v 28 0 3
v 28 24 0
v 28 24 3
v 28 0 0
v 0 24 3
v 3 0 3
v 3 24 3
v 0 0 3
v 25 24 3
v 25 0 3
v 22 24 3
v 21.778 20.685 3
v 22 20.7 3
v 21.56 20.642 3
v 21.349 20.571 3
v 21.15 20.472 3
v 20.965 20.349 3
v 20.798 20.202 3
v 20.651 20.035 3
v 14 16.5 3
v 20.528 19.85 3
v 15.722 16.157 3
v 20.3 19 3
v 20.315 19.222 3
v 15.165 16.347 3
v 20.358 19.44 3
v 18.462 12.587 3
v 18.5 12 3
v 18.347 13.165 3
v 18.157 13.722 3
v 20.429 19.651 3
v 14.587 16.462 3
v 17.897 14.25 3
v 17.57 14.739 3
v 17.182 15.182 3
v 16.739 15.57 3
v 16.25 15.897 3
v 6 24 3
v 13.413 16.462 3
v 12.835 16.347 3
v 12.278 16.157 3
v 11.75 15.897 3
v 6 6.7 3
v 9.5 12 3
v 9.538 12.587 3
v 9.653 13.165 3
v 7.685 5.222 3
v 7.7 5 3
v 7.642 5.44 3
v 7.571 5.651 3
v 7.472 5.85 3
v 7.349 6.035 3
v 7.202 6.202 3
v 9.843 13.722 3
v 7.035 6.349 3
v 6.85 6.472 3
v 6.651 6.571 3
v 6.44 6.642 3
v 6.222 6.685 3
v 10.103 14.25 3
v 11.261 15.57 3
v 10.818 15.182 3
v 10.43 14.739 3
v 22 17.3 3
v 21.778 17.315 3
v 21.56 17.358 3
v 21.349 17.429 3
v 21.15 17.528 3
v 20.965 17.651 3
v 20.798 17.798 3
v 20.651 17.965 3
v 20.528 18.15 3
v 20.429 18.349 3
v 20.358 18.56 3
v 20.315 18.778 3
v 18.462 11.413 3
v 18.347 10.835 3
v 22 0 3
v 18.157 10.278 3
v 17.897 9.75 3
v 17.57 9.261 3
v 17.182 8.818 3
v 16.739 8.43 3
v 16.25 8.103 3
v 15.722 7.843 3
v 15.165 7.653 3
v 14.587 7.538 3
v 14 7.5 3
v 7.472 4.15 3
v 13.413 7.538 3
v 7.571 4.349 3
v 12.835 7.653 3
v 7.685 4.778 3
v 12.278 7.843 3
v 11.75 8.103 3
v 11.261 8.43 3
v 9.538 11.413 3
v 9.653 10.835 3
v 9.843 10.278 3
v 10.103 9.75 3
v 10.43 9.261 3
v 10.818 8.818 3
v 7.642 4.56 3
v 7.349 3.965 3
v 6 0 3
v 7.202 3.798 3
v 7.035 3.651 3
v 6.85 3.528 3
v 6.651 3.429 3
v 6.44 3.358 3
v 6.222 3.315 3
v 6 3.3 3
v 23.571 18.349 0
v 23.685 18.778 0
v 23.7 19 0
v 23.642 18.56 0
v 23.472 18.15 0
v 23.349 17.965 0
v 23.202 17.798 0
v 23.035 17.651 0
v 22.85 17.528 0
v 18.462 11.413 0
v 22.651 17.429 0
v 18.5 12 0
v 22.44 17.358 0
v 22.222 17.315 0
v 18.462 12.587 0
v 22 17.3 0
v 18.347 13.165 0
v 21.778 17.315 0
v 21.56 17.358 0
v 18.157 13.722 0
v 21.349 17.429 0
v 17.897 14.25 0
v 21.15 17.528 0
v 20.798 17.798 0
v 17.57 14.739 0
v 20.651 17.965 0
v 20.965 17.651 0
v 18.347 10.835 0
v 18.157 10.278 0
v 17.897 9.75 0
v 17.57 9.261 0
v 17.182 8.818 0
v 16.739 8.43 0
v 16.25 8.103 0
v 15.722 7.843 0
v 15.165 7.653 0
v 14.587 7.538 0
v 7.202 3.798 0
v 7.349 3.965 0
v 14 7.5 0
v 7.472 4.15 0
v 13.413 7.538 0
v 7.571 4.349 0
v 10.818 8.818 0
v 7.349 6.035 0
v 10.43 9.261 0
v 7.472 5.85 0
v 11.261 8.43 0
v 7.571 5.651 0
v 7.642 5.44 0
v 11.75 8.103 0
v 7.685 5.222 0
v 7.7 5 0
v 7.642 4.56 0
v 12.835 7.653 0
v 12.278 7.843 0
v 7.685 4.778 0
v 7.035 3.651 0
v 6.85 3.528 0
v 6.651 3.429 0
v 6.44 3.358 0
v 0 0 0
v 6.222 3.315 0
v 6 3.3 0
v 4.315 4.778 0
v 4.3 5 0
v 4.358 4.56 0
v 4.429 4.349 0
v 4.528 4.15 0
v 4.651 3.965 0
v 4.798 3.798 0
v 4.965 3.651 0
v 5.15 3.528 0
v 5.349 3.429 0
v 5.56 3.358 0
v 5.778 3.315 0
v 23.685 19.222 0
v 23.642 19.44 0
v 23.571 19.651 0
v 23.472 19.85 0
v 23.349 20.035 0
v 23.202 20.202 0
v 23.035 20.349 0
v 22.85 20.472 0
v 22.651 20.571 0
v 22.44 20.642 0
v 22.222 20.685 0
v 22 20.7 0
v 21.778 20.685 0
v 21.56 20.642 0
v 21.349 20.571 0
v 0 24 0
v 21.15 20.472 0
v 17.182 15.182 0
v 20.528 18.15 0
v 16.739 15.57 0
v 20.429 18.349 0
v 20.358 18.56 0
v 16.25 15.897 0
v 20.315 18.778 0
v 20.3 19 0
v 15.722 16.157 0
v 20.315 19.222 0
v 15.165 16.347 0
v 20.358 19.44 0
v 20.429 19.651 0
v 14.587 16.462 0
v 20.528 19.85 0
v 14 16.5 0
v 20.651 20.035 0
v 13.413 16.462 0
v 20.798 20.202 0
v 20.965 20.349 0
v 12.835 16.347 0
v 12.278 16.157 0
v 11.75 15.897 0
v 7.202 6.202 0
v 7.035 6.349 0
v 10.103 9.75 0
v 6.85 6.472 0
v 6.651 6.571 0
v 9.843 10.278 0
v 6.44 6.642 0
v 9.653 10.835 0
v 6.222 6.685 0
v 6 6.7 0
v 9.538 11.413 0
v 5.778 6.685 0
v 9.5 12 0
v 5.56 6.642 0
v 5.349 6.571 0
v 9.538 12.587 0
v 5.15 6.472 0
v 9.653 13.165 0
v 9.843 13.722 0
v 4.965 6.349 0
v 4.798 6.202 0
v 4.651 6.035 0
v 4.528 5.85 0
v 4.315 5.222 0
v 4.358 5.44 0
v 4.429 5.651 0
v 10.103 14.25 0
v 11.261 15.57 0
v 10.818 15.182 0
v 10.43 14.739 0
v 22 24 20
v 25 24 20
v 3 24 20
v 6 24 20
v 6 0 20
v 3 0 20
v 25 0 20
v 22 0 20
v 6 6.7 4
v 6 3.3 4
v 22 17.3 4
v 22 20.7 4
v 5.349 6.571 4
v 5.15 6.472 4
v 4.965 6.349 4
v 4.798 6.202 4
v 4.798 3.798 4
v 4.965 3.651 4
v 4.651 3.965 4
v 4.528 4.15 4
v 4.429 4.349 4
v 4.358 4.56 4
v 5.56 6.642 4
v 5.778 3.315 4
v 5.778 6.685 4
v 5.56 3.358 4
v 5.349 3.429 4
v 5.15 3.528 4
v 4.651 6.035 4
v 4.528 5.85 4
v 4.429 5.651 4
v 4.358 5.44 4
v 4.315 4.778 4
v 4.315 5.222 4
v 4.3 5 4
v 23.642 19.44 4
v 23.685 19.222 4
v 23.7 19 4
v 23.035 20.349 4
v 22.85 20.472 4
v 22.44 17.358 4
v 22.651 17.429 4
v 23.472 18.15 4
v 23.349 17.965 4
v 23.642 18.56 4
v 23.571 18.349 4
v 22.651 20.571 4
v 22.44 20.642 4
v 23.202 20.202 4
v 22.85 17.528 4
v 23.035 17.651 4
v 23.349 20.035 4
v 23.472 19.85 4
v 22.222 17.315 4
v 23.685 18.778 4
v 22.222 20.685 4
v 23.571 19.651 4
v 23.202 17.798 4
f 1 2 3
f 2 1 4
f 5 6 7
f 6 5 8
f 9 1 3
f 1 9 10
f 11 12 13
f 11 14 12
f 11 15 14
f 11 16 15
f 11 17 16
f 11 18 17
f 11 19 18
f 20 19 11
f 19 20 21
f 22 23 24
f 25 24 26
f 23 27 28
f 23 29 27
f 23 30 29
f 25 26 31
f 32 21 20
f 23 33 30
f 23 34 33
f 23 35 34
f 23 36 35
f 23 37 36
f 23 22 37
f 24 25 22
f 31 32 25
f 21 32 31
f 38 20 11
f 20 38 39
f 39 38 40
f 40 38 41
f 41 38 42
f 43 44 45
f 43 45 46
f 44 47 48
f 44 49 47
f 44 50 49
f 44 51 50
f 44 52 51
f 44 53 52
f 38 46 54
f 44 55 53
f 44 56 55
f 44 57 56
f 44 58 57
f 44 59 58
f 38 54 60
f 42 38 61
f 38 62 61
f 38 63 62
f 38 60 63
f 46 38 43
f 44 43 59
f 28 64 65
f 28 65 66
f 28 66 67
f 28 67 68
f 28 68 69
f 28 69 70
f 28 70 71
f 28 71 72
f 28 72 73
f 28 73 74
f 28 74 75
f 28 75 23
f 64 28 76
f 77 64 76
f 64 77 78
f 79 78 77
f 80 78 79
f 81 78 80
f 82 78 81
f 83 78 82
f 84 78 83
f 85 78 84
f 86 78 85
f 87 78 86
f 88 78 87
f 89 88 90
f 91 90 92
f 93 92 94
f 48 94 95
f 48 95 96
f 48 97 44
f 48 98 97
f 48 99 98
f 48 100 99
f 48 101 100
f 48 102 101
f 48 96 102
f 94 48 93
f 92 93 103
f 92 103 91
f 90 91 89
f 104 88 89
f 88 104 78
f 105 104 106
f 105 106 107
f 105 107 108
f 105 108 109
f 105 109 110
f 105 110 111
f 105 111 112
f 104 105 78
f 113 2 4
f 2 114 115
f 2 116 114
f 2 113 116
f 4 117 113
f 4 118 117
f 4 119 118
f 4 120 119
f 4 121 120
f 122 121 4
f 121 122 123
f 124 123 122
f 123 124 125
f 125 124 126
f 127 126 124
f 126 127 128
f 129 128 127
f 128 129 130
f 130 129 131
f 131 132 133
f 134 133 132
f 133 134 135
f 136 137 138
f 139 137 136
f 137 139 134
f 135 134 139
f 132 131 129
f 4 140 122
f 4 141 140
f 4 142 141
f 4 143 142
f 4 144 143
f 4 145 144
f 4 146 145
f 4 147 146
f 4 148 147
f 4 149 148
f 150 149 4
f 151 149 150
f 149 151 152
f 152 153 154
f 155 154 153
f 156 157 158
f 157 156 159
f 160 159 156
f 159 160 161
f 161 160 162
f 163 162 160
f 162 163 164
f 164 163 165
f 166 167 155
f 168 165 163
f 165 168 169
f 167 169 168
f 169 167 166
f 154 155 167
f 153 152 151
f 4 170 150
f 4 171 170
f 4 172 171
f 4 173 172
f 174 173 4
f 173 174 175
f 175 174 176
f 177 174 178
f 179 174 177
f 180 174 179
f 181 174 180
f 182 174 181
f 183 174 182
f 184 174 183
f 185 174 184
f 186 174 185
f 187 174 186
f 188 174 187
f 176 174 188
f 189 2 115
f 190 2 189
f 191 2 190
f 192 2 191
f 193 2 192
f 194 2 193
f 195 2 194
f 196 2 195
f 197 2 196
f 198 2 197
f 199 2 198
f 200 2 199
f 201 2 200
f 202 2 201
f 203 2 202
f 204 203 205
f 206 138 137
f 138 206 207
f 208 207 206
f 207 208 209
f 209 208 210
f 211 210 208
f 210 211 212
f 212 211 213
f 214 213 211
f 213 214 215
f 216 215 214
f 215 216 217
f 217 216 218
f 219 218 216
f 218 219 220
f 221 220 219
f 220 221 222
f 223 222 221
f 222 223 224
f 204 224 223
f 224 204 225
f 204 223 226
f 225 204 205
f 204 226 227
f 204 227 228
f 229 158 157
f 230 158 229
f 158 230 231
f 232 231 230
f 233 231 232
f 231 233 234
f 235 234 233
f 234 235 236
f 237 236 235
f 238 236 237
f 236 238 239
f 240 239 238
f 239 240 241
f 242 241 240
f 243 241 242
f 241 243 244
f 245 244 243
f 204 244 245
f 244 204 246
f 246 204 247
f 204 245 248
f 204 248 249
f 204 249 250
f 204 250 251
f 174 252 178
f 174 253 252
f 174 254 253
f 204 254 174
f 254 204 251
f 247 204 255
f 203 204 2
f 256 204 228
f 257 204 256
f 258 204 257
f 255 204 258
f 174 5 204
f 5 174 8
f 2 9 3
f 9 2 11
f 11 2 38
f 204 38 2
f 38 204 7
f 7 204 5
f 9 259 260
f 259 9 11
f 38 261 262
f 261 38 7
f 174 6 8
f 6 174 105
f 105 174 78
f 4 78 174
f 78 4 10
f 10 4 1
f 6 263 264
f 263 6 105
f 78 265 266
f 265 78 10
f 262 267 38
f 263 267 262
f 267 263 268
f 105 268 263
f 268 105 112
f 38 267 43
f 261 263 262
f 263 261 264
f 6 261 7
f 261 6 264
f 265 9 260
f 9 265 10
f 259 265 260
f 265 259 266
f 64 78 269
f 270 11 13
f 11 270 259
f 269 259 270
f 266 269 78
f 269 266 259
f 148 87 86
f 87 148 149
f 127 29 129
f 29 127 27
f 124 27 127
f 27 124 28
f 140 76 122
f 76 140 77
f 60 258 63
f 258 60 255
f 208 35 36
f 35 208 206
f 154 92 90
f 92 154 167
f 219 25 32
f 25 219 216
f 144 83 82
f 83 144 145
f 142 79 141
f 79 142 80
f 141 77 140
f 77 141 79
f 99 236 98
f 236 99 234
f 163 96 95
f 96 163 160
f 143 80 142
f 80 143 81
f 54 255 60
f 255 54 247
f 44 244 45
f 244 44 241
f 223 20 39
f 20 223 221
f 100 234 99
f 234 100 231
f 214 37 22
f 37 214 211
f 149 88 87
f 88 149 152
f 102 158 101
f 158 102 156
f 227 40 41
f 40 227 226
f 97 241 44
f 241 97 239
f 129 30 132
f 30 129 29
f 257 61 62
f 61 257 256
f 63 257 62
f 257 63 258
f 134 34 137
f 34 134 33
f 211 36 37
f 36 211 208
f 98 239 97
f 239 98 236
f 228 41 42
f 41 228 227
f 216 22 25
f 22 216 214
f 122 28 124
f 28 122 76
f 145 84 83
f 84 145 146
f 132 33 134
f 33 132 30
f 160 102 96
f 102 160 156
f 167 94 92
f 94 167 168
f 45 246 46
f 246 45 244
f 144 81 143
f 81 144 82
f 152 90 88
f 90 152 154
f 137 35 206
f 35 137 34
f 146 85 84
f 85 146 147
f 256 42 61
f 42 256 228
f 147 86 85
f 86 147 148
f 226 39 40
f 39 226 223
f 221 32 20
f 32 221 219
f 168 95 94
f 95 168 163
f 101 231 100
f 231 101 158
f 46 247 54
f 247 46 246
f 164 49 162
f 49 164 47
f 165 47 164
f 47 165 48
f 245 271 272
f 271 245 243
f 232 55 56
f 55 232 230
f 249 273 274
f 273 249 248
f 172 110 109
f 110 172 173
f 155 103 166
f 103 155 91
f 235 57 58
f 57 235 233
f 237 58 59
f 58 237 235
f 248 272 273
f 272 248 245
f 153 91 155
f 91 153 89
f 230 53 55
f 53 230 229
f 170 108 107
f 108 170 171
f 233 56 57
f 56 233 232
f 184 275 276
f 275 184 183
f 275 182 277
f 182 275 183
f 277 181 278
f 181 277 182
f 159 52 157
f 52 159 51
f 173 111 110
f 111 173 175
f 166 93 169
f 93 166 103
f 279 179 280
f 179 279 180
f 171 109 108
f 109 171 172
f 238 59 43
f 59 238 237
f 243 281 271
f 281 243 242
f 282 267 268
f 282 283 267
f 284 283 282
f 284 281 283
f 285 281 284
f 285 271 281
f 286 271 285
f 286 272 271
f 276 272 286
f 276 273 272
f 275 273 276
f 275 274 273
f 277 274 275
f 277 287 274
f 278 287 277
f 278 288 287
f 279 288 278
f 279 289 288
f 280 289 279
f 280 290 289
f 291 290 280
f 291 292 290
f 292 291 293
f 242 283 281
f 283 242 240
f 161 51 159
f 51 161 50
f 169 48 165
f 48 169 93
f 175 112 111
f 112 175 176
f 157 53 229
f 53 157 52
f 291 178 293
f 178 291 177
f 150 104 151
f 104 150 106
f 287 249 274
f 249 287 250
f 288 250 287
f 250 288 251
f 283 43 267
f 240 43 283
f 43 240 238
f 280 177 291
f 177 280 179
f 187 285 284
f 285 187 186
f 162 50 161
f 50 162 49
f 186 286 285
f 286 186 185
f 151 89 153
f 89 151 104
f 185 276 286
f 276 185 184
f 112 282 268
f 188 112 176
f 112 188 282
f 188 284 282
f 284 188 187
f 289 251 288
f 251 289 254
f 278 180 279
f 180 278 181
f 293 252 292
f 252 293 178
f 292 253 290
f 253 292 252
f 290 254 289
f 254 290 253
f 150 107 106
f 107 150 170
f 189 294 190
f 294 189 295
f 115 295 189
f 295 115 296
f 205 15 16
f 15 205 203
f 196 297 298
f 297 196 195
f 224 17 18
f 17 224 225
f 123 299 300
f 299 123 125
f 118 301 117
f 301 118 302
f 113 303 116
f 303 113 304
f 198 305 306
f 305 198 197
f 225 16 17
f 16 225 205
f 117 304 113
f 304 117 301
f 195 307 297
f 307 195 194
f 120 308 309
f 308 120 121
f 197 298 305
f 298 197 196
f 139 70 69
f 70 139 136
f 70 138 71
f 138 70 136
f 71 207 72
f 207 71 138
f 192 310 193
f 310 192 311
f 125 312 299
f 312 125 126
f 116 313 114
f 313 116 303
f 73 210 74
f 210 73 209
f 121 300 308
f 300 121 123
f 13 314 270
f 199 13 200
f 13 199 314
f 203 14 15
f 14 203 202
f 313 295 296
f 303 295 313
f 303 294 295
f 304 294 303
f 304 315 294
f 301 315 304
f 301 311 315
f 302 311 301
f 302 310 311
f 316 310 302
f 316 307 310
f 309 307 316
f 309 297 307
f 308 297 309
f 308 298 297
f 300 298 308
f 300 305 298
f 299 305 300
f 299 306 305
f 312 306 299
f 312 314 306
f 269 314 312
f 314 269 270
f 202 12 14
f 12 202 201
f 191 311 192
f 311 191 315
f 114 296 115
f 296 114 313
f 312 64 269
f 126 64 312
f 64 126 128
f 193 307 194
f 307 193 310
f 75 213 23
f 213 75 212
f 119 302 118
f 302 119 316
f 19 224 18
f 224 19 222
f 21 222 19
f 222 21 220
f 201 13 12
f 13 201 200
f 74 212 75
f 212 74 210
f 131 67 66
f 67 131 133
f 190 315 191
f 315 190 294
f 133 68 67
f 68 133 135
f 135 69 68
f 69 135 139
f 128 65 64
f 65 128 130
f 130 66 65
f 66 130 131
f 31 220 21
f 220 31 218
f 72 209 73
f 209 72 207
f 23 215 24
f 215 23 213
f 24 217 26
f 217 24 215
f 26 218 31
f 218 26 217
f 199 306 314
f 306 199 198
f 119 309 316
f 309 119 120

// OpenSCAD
$fn=48;
difference(){union(){cube([28,24,3]);translate([3,0,0])cube([3,24,20]);translate([22,0,0])cube([3,24,20]);}translate([14,12,-1])cylinder(h=5,r=4.5);translate([6,5,-1])cylinder(h=5,r=1.7);translate([22,19,-1])cylinder(h=5,r=1.7);}
